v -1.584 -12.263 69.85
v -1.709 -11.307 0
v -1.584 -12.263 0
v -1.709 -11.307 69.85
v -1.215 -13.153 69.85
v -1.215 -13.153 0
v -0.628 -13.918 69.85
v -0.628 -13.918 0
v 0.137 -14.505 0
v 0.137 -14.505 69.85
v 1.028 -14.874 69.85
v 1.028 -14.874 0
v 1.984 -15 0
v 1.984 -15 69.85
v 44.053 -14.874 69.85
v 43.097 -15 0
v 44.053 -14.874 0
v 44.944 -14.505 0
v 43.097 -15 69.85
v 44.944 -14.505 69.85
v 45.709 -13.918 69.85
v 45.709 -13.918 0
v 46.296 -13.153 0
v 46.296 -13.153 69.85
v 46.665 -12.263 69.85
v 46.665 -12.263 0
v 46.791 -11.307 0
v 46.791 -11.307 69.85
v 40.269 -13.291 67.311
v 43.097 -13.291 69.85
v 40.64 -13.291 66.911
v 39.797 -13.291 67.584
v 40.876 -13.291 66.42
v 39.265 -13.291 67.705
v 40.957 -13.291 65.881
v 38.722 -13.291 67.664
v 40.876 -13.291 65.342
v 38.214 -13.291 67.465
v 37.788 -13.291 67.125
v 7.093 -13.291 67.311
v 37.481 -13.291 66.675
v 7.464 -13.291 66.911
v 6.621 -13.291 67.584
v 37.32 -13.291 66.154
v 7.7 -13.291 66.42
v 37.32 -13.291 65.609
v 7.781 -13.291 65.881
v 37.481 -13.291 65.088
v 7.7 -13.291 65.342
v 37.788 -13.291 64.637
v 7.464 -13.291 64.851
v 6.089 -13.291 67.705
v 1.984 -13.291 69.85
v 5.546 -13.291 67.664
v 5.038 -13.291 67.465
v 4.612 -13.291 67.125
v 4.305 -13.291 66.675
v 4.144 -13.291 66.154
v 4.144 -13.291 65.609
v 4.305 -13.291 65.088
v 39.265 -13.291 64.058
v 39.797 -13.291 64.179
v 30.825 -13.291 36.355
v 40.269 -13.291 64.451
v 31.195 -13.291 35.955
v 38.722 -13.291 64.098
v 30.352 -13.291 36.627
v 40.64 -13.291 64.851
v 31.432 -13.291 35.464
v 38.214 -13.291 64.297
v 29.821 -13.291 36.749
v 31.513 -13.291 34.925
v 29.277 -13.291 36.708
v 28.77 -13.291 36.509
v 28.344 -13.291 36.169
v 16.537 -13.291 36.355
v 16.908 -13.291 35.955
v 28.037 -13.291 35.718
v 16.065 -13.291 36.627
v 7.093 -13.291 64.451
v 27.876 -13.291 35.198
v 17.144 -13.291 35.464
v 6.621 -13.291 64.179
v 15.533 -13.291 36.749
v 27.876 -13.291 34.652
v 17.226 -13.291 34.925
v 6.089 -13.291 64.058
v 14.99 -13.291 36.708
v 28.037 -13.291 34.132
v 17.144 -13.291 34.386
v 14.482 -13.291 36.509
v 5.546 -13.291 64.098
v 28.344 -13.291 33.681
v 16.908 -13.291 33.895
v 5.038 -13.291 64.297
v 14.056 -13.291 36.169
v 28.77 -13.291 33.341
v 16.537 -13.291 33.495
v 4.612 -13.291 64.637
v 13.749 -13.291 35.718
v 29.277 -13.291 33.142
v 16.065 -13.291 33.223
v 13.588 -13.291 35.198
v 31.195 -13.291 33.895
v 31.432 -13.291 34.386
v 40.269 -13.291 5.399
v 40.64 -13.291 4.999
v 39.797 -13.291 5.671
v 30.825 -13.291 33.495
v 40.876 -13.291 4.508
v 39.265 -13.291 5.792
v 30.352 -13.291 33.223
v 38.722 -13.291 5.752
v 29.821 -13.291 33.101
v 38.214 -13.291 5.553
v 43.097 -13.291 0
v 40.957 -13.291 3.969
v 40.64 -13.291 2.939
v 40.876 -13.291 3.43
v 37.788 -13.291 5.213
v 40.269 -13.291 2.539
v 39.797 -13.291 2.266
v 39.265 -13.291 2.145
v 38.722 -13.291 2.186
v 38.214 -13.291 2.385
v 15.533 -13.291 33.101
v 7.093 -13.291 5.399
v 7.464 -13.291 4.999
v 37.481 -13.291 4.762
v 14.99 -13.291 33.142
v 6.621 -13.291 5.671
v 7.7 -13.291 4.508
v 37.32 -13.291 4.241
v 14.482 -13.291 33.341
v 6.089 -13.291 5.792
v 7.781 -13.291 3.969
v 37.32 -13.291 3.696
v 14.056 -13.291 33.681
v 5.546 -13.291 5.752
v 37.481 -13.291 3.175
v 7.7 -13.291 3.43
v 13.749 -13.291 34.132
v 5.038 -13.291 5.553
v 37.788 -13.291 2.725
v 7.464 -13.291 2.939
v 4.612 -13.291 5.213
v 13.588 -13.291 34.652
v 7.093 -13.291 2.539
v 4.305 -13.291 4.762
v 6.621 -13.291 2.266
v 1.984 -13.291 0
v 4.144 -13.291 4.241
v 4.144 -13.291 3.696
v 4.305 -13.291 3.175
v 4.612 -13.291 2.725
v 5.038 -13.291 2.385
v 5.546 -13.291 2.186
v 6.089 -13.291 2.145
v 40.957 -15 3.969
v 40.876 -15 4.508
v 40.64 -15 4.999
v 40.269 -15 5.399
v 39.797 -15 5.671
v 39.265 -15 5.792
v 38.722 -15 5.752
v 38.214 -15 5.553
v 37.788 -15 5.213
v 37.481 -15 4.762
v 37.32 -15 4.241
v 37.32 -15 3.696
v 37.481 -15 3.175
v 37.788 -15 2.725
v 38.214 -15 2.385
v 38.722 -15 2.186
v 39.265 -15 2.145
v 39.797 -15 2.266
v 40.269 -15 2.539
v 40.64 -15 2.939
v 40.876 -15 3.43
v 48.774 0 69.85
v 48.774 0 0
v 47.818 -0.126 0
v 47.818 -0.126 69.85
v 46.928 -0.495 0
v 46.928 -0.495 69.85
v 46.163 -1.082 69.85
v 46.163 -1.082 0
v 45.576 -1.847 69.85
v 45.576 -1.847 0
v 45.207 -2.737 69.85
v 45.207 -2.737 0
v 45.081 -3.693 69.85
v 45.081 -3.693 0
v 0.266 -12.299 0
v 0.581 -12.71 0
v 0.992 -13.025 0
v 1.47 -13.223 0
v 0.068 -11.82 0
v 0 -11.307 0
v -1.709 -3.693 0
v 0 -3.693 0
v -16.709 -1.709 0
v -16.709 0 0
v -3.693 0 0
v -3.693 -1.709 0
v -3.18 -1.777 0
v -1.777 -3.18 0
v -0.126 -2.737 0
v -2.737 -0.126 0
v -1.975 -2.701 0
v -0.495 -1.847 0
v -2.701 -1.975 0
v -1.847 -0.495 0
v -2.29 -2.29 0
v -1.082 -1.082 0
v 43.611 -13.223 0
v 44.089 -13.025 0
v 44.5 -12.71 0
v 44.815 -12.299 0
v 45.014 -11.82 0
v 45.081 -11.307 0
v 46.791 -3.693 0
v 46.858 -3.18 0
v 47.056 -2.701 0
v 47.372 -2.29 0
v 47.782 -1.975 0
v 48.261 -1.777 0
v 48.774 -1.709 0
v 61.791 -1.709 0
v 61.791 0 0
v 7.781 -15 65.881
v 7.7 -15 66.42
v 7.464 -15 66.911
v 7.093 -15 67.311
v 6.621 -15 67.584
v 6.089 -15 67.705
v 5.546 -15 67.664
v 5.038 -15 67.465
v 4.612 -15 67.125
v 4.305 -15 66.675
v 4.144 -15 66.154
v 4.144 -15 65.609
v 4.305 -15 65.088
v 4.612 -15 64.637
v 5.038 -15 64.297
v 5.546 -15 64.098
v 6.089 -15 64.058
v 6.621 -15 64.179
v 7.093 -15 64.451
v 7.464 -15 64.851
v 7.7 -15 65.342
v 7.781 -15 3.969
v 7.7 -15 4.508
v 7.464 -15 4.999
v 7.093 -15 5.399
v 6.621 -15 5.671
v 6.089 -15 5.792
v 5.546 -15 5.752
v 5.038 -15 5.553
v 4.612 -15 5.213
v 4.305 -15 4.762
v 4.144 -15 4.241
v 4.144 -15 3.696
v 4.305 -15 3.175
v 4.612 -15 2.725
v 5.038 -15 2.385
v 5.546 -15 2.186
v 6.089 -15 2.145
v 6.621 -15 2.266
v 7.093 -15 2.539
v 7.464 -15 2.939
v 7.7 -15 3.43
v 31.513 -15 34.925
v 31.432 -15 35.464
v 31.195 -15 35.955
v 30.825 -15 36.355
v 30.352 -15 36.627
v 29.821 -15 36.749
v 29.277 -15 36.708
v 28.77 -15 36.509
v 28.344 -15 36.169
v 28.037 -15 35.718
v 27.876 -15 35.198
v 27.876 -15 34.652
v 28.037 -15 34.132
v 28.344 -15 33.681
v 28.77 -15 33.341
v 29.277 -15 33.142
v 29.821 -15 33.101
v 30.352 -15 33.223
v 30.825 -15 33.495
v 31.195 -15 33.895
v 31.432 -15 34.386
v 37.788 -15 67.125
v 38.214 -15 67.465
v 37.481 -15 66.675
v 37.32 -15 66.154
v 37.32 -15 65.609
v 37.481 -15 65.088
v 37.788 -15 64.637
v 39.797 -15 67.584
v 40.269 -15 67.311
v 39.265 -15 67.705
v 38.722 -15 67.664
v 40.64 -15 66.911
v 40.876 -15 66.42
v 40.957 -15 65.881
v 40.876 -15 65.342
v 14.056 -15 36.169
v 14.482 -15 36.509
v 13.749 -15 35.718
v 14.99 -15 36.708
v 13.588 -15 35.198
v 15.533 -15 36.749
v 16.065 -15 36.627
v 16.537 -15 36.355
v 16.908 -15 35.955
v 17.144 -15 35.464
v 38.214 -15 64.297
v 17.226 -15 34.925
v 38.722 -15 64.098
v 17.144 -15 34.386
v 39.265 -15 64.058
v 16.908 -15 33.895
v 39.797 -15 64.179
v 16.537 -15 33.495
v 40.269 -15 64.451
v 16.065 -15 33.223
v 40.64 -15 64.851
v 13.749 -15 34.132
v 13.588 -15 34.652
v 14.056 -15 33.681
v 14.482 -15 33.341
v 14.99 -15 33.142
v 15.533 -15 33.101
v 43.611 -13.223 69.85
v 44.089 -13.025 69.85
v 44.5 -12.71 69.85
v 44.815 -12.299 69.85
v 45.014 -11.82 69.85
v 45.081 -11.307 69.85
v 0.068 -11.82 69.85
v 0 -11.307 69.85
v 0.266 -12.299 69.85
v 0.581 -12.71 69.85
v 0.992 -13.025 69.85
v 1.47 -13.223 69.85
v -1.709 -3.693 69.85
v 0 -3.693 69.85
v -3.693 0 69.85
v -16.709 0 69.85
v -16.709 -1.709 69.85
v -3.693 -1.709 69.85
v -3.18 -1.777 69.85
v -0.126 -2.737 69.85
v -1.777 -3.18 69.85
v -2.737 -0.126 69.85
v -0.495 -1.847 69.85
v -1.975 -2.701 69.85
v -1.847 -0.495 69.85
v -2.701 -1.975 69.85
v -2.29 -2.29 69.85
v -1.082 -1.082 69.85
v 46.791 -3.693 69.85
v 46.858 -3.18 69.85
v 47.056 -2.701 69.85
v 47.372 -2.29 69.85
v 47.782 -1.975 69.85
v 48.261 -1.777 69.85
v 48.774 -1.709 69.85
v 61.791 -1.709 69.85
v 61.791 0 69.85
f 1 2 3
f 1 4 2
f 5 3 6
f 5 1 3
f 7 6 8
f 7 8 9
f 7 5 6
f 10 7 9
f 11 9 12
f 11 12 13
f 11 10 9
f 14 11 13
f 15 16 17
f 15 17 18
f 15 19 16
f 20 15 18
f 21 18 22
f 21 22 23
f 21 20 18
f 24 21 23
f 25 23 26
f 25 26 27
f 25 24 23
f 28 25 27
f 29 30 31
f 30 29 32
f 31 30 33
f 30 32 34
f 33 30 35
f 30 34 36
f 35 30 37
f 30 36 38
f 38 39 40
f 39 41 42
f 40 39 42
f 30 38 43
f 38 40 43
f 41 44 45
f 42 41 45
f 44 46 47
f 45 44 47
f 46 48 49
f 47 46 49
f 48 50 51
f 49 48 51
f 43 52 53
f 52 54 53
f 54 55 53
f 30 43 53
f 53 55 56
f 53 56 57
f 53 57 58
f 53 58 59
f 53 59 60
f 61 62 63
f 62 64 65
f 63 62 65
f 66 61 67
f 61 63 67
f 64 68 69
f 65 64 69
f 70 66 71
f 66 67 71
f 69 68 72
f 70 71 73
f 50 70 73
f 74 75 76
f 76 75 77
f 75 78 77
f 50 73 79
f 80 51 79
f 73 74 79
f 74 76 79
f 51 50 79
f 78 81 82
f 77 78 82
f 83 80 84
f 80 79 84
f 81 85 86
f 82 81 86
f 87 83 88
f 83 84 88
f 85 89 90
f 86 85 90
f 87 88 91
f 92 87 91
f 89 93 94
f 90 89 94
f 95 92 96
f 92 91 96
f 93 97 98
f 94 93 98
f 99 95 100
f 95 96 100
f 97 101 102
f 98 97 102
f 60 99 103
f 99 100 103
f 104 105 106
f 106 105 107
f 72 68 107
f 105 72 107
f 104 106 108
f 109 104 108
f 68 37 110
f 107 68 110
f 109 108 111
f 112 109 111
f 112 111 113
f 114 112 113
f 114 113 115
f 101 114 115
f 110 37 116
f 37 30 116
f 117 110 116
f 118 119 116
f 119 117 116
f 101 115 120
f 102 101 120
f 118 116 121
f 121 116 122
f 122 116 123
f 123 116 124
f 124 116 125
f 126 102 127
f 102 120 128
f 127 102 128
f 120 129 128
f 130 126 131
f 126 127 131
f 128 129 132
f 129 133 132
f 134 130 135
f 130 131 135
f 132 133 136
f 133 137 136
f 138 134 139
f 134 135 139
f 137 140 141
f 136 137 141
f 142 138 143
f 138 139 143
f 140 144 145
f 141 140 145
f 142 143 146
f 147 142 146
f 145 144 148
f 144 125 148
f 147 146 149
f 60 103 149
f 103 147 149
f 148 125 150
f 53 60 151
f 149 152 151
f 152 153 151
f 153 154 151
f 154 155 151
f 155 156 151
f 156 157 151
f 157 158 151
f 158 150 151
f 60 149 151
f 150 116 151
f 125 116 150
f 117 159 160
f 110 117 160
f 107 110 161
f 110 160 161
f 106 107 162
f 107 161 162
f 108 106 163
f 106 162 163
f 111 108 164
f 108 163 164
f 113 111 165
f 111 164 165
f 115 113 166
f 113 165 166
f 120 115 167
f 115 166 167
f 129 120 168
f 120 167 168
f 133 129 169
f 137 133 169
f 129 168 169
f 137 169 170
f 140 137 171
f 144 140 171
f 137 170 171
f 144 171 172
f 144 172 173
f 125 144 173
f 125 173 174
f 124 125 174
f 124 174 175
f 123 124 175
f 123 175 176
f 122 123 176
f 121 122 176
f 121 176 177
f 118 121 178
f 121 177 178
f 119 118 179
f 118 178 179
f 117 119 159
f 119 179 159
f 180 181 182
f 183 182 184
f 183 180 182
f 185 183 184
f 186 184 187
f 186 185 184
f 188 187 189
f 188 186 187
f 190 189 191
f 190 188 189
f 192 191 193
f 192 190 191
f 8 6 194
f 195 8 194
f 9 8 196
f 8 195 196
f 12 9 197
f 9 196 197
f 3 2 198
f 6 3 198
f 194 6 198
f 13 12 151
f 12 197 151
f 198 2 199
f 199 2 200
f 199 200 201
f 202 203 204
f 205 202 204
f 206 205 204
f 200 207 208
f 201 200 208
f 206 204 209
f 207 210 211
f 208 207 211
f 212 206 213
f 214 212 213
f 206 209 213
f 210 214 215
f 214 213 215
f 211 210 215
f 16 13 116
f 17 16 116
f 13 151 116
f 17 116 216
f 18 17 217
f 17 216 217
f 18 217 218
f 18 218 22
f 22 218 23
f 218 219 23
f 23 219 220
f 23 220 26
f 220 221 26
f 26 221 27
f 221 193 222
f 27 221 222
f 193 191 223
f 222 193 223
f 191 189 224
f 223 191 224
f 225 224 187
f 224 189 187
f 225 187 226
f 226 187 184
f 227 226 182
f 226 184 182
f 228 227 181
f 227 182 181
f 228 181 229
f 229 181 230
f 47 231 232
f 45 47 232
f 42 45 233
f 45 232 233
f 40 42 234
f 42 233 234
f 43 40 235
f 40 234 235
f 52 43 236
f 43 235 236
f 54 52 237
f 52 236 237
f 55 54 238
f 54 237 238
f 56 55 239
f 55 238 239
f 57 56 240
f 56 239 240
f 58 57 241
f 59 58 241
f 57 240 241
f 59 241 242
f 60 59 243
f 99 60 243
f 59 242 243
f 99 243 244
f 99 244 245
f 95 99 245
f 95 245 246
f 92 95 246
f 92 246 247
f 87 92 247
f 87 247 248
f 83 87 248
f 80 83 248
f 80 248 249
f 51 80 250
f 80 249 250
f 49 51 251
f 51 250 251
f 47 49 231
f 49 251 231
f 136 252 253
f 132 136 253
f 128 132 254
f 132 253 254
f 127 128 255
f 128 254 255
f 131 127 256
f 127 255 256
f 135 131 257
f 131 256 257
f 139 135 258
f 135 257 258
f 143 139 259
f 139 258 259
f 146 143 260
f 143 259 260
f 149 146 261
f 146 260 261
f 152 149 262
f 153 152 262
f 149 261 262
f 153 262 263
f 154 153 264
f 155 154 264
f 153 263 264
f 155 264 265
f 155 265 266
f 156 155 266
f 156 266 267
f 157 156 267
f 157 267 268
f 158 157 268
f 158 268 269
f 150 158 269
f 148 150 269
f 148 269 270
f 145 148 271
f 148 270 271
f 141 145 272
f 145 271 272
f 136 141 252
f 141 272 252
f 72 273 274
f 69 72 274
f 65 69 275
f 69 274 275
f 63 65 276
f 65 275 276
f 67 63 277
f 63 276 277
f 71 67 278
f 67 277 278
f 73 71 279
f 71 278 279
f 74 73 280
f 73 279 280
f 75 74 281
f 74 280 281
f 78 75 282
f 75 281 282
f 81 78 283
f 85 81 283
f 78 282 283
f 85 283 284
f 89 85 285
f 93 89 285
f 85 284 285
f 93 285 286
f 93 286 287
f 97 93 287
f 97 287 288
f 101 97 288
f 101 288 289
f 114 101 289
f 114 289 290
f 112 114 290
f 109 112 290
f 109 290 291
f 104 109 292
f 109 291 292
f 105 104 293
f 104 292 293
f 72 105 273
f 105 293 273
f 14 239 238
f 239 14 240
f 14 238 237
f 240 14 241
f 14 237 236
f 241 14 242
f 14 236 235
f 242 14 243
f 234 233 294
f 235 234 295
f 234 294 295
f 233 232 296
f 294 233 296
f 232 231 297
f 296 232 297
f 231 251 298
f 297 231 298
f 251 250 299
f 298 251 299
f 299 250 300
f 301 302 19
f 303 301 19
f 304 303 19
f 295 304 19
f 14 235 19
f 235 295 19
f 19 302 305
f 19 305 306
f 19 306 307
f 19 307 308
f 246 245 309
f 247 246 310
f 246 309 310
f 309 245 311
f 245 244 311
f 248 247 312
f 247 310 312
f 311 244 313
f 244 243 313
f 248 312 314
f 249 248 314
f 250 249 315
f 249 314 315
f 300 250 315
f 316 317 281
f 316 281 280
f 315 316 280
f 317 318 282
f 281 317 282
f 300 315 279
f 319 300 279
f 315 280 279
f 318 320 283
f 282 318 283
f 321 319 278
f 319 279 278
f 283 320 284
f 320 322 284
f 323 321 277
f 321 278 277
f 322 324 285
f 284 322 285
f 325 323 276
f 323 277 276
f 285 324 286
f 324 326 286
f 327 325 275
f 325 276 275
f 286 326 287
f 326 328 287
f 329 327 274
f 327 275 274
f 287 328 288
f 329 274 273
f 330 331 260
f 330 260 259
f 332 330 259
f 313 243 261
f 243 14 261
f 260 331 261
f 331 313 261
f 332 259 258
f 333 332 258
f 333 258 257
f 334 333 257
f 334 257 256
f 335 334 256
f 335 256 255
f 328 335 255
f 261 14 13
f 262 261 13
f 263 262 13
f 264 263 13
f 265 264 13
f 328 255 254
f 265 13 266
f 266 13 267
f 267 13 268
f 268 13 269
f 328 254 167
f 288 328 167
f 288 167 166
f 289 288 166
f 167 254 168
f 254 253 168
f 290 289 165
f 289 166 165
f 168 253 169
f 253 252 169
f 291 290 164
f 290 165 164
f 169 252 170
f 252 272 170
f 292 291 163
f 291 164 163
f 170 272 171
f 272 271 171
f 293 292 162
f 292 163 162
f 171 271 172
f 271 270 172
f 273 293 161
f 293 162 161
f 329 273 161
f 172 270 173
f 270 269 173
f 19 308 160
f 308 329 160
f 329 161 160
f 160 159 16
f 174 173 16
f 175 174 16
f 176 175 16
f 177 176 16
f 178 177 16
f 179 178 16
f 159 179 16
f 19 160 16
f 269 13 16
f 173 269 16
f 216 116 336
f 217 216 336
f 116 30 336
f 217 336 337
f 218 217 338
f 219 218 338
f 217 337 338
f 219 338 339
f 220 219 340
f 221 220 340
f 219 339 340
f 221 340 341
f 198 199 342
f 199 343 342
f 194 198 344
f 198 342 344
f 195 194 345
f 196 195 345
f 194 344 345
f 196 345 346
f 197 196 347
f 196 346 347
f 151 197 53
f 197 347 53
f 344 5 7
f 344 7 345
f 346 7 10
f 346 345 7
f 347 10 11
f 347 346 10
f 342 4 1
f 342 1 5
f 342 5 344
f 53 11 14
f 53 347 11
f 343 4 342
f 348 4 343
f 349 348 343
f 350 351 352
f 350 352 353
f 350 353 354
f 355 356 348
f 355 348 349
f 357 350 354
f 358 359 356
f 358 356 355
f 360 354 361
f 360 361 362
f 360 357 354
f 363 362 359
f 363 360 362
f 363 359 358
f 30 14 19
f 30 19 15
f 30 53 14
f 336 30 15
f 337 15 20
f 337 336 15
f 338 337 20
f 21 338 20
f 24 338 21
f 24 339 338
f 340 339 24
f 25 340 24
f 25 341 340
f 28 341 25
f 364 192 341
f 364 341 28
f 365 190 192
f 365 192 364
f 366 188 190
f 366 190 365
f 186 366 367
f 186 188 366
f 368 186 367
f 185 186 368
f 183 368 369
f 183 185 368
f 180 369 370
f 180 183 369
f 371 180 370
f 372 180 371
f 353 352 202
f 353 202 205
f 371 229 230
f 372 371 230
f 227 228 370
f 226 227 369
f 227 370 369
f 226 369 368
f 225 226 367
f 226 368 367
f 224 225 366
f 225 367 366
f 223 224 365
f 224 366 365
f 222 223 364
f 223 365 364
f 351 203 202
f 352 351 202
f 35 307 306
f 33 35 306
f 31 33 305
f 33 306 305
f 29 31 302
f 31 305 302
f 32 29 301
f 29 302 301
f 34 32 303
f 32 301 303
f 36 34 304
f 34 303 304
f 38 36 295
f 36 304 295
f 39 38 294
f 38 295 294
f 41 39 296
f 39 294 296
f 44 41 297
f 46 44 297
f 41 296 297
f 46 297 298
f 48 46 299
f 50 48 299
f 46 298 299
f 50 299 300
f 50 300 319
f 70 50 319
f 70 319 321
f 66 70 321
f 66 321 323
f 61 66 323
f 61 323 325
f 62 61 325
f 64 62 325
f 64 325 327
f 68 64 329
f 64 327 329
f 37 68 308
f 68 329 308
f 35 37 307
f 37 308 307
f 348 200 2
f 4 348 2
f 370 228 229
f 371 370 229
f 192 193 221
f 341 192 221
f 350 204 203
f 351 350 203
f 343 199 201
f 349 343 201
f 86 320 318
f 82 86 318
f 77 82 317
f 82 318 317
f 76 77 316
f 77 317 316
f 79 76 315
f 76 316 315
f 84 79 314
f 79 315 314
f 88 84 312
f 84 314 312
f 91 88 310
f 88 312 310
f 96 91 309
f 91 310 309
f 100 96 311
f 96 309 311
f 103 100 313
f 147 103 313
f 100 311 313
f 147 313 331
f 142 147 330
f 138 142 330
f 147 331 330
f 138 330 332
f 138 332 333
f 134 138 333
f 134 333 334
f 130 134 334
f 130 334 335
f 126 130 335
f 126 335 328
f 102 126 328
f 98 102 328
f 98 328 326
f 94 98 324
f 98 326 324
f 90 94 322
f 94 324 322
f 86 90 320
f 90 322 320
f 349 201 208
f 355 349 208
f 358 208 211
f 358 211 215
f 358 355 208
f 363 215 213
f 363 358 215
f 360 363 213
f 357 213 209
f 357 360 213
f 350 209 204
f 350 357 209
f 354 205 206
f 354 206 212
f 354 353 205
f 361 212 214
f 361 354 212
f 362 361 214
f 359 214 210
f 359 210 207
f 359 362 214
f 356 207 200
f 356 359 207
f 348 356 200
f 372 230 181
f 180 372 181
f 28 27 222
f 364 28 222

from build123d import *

# Parameters (mm, degrees)
F1_DEPTH = 69.85
F2_R     = 3.69316
F3_R     = 1.98374
F4_R     = 1.8288
F5_DEPTH = 1.70942


with BuildPart() as f1:
    # F0 (on Top) → F1 (new body)
    with BuildSketch(Plane.XY):
        Polygon((0, -13.290575), (0, 0), (-16.70942, 0), (-16.70942, -1.70942), (-1.70942, -1.70942), (-1.70942, -14.999995), (46.79058, -14.999995), (46.79058, -1.70942), (61.79058, -1.70942), (61.79058, 0), (45.08116, 0), (45.08116, -13.290575), align=None)
    extrude(amount=F1_DEPTH)

    # F2
    f2_edges = [f1.edges().sort_by_distance(p)[0] for p in [
        (46.79058, -14.999995, 34.925),
        (-1.70942, -14.999995, 34.925),
        (0, 0, 34.925),
        (45.08116, 0, 34.925),
    ]]
    fillet(f2_edges, radius=F2_R)

    # F3
    f3_edges = [f1.edges().sort_by_distance(p)[0] for p in [
        (0, -13.290575, 34.925),
        (45.08116, -13.290575, 34.925),
        (46.79058, -1.70942, 34.925),
        (-1.70942, -1.70942, 34.925),
    ]]
    fillet(f3_edges, radius=F3_R)

    # F4 (on face) → F5 (cut, through all)
    with BuildSketch(Plane.XZ.offset(14.999995)):
        with Locations((39.12867, 65.88125)):
            Circle(F4_R)
        with Locations((5.95249, 65.88125)):
            Circle(F4_R)
        with Locations((5.95249, 3.96875)):
            Circle(F4_R)
        with Locations((39.12867, 3.96875)):
            Circle(F4_R)
        with Locations((15.39683, 34.925)):
            Circle(F4_R)
        with Locations((29.68433, 34.925)):
            Circle(F4_R)
    extrude(amount=-F5_DEPTH, mode=Mode.SUBTRACT)


solid = f1.part
